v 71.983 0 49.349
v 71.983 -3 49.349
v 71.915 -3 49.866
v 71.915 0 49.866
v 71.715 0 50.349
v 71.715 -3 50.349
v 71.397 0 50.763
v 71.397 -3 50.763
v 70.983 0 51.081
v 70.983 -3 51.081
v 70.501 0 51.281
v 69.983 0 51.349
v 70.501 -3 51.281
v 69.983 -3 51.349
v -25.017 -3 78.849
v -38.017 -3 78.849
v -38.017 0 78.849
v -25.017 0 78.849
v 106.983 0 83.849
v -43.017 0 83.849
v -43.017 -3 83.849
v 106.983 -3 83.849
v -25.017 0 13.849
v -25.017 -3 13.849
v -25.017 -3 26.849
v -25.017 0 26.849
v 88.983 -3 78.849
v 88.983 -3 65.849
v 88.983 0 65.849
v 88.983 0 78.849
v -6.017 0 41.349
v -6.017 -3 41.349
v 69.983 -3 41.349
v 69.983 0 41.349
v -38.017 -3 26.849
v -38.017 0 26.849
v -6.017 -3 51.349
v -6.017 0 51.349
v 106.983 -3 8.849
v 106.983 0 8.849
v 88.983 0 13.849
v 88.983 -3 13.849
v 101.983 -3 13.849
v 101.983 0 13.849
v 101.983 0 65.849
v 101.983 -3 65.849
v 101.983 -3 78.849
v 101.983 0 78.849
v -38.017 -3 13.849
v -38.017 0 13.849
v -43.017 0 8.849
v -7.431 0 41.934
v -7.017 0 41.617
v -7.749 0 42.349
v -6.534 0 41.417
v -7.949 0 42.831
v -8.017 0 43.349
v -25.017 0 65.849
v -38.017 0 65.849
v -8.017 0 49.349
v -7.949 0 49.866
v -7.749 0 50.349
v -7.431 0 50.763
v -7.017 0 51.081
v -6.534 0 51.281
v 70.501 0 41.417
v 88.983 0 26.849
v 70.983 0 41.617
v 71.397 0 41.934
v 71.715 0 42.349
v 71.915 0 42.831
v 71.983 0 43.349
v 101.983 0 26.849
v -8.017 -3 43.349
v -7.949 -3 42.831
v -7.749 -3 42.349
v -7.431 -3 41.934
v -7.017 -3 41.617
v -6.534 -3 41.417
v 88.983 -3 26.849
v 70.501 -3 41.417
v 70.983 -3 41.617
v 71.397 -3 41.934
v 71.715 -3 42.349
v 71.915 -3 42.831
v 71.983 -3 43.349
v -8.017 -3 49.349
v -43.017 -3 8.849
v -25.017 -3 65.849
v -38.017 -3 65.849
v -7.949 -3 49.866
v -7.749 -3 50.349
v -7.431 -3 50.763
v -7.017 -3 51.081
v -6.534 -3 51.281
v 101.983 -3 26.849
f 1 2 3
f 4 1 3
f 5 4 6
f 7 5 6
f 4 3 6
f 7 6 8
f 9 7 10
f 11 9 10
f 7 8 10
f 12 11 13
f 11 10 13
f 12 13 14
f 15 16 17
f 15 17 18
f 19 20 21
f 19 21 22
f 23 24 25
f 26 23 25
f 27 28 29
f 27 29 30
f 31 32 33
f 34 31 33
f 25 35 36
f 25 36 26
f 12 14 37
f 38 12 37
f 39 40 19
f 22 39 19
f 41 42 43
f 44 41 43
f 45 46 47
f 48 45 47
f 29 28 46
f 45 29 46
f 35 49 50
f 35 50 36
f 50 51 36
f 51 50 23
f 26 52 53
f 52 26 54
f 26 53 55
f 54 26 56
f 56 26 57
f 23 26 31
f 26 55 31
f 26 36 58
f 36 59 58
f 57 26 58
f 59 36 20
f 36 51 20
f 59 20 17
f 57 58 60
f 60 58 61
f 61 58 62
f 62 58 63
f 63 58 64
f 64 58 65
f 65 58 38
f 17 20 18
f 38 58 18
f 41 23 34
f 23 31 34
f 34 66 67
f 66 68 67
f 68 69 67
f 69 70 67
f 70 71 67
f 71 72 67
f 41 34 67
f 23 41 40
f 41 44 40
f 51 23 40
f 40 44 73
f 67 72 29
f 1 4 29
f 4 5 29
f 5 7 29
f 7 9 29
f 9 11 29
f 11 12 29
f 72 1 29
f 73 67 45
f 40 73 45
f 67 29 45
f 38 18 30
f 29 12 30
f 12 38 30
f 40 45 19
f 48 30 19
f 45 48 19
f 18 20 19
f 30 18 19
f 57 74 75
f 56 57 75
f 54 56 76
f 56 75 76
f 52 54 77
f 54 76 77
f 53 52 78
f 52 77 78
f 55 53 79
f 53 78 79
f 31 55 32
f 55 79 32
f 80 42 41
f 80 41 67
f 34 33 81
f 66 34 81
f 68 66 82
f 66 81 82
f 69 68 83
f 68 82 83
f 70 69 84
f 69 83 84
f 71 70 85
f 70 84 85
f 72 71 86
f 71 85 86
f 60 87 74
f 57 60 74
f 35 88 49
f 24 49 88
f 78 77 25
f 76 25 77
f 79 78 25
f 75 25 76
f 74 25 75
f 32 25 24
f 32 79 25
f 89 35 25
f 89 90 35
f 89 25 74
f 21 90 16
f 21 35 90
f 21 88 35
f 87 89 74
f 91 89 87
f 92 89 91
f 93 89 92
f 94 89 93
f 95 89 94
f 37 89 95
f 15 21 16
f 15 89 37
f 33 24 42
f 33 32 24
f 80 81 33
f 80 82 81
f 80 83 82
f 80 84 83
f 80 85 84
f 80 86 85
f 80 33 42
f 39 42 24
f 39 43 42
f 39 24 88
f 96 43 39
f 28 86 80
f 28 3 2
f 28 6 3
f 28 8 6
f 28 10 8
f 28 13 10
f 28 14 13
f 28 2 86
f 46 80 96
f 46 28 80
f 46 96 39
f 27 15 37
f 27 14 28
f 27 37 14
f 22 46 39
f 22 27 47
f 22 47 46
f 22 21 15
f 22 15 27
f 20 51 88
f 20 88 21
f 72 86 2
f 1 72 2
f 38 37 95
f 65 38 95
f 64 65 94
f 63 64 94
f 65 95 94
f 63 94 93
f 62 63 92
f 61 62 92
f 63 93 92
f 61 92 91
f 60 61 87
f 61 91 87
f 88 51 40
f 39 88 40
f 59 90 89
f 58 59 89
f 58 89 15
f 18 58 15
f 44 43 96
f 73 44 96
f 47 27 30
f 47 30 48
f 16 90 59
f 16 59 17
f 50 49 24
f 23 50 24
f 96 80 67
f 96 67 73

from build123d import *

# Parameters (mm, degrees)
F0_W     = 150
F0_H     = 75
F1_DEPTH = 3
F2_W     = 13
F2_H     = 13
F3_DEPTH = 4


with BuildPart() as f1:
    # F0 (on Front) → F1 (new body)
    with BuildSketch(Plane.XZ):
        with Locations((31.983163, 46.348685)):
            Rectangle(F0_W, F0_H)
    extrude(amount=F1_DEPTH)

    # F2 (on face) → F3 (cut)
    with BuildSketch(Plane.XZ.offset(3)):
        with Locations((-31.516837, 72.348685)):
            Rectangle(F2_W, F2_H)
        with Locations((-31.516837, 20.348685)):
            Rectangle(F2_W, F2_H)
        with Locations((95.483163, 20.348685)):
            Rectangle(F2_W, F2_H)
        with Locations((95.483163, 72.348685)):
            Rectangle(F2_W, F2_H)
        with BuildLine():
            Line((69.983163, 51.348685), (-6.016837, 51.348685))
            ThreePointArc((-6.016837, 51.348685), (-7.431051, 50.762899), (-8.016837, 49.348685))
            Line((-8.016837, 49.348685), (-8.016837, 43.348685))
            ThreePointArc((-8.016837, 43.348685), (-7.431051, 41.934472), (-6.016837, 41.348685))
            Line((-6.016837, 41.348685), (69.983163, 41.348685))
            ThreePointArc((69.983163, 41.348685), (71.397376, 41.934472), (71.983163, 43.348685))
            Line((71.983163, 43.348685), (71.983163, 49.348685))
            ThreePointArc((71.983163, 49.348685), (71.397376, 50.762899), (69.983163, 51.348685))
        make_face()
    extrude(amount=-F3_DEPTH, mode=Mode.SUBTRACT)


solid = f1.part
